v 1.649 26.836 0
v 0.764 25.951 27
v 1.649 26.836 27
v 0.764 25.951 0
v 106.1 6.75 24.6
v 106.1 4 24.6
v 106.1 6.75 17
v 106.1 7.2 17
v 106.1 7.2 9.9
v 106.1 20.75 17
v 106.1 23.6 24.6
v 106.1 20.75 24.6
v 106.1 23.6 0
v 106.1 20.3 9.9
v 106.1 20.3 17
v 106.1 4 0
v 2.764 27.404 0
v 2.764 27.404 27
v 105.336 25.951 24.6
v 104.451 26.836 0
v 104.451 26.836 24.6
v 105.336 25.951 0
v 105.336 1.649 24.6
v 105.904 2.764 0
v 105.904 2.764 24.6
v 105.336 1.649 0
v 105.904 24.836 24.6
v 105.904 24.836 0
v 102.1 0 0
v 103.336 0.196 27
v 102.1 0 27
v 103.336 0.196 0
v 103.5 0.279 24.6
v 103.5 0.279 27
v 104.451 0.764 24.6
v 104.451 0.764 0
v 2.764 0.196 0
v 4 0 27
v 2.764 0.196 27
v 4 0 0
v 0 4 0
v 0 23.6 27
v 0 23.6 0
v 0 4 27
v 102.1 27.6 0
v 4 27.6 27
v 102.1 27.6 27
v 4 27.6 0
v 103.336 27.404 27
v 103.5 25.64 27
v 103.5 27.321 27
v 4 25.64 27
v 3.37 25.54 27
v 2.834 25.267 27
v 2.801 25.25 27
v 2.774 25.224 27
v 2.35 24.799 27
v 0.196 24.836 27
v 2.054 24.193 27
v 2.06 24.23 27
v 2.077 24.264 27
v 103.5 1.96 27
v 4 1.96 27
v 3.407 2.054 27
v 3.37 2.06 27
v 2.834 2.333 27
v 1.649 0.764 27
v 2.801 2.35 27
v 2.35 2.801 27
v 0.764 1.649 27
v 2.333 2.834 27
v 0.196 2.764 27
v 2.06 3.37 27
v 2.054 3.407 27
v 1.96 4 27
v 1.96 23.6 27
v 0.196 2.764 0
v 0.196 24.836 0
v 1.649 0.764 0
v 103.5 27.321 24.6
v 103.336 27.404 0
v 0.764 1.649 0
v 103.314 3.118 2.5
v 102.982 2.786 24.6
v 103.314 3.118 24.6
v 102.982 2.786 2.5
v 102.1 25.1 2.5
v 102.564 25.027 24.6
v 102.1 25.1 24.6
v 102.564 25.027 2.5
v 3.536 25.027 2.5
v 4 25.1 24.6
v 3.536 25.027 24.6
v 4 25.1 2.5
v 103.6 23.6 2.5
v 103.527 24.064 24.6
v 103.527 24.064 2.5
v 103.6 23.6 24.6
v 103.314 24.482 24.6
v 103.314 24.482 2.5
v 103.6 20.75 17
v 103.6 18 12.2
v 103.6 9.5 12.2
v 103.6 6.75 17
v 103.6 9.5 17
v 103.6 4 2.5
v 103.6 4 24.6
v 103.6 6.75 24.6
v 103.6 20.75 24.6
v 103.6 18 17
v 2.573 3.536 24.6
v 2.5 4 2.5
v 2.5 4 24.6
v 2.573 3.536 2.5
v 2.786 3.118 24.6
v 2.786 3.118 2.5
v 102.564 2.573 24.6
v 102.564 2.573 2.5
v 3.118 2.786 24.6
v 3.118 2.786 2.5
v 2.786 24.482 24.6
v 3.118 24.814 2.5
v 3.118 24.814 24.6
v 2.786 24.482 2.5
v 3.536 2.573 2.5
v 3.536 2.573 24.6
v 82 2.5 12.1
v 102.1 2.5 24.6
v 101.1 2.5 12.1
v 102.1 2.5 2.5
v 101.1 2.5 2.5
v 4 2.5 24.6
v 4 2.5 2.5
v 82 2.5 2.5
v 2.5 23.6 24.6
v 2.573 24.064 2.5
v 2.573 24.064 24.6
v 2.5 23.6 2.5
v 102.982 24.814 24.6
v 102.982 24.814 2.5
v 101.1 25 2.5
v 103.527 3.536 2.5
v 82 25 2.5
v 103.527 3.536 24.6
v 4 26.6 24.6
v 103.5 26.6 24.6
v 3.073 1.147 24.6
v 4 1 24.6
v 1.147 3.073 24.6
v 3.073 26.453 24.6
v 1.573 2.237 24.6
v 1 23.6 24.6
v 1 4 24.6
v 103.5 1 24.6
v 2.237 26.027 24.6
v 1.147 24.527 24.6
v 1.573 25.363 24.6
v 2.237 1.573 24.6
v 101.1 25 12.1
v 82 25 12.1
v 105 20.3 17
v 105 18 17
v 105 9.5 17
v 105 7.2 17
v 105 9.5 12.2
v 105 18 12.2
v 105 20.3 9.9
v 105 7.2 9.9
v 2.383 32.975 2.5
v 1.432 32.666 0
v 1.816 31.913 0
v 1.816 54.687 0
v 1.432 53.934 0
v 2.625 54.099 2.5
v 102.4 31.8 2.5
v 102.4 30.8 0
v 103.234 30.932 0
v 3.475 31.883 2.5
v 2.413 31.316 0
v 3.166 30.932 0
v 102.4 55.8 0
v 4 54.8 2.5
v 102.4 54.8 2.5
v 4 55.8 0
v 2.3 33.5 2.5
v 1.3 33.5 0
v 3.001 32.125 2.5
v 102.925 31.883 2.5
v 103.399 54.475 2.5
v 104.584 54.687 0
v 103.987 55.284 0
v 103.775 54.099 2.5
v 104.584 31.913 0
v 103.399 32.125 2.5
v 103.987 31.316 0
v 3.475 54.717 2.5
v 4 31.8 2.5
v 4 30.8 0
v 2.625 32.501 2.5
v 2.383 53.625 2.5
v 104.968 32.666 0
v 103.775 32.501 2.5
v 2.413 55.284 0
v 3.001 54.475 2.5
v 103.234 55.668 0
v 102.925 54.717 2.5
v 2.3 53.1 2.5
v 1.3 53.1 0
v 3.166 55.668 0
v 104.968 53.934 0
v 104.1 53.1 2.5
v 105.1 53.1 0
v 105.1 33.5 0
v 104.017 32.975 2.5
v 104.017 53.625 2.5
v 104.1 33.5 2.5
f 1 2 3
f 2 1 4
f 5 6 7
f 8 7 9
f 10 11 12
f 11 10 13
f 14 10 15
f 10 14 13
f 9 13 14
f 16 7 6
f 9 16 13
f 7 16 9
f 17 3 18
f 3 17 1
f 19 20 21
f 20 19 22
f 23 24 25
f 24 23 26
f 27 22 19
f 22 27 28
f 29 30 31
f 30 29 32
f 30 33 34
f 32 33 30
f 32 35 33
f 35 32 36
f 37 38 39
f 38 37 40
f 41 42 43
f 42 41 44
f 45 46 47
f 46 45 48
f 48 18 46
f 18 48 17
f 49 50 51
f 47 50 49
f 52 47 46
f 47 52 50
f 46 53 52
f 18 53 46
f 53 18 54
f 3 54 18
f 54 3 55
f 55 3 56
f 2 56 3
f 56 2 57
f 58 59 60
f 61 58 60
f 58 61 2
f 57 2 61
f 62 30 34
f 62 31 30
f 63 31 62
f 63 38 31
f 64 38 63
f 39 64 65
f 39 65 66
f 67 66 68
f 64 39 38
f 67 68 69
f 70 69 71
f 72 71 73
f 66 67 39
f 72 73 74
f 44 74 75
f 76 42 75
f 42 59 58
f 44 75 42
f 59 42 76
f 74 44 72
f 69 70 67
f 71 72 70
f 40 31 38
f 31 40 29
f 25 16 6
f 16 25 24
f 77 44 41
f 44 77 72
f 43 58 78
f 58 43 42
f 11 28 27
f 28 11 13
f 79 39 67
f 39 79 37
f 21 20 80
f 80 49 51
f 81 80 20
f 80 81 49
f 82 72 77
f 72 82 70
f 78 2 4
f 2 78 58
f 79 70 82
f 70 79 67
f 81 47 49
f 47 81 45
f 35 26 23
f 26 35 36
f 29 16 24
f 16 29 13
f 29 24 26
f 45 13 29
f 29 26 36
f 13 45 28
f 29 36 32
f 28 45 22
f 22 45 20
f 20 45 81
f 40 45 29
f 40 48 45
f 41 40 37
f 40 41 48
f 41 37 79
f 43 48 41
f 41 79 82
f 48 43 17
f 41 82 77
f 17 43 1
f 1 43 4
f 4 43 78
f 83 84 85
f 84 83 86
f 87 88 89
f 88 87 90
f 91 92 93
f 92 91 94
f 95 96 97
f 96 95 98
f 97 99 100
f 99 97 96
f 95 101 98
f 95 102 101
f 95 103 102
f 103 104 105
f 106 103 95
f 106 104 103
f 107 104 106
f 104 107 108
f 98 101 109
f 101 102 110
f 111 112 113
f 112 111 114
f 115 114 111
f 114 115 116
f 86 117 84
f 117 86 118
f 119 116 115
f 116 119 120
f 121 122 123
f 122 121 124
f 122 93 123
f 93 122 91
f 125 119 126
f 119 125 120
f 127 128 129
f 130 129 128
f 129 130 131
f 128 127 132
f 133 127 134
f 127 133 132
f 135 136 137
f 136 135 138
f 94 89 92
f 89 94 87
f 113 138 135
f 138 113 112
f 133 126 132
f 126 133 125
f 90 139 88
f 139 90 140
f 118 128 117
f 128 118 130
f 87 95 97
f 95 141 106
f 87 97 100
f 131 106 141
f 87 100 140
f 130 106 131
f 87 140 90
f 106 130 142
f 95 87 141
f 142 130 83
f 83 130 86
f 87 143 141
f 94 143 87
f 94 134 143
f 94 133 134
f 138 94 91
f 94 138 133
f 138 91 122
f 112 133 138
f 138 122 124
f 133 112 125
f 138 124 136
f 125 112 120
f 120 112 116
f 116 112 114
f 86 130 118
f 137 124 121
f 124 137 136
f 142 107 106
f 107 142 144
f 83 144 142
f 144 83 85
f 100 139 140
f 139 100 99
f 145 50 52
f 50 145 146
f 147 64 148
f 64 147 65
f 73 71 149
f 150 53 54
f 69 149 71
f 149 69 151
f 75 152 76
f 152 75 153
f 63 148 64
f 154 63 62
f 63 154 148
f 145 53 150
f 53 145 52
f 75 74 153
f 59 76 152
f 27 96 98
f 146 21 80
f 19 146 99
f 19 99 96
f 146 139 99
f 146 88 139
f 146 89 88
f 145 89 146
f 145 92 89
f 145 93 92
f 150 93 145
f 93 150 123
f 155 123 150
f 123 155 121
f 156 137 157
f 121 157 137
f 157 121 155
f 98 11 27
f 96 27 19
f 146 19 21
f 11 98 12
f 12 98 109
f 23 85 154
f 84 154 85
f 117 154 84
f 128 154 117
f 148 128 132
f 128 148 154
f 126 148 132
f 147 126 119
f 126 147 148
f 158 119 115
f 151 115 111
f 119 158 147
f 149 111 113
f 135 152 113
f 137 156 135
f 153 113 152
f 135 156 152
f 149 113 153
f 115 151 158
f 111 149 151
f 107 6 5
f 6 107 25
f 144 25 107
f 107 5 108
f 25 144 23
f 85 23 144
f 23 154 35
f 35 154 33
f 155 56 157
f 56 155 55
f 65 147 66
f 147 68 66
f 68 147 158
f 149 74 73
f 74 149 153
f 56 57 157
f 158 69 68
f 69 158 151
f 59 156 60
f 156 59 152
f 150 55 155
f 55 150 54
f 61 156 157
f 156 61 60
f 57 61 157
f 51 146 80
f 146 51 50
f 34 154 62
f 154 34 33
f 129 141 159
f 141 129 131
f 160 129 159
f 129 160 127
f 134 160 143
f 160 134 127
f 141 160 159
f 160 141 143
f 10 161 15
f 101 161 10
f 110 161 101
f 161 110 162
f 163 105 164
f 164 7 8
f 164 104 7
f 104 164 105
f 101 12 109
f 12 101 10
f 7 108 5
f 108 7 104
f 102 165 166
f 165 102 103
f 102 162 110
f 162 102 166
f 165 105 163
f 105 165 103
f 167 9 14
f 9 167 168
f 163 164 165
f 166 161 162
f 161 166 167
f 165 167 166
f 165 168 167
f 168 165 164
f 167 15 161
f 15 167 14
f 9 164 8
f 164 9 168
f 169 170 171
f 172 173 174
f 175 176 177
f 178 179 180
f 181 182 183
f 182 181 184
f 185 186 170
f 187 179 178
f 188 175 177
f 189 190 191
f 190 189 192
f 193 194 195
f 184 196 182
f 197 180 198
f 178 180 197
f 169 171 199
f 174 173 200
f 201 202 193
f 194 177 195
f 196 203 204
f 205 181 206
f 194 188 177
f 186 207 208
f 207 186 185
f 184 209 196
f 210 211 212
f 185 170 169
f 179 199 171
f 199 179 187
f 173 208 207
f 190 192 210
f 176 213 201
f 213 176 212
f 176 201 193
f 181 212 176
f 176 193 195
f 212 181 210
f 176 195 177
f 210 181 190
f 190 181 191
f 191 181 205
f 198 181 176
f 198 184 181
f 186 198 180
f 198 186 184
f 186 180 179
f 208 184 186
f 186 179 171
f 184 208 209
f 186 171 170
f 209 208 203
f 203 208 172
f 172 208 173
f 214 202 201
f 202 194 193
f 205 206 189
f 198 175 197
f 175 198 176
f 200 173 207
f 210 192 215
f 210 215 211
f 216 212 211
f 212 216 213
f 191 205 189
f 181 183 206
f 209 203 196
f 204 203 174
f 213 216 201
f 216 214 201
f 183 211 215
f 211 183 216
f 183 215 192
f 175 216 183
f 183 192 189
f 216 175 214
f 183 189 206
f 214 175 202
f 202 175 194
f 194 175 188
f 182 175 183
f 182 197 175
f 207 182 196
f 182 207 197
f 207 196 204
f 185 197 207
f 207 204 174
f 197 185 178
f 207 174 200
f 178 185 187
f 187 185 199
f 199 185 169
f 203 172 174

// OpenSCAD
// Box to a 18650 battery in a holder plus usb charger
// 
// R J Tidey 21 NOV 2017
//

//Set up basic dimesnsions
i_width = 22.5;
i_length = 101.0;
i_height = 22.0;

wall = 2.5;

//extra width for mounting stuff
e_width = 0.0;

//slot for charging point; set socket_A to 0 to allow only micro USB access
socket_A = 1;
socket_height1 = 7.5;
socket_width1 = 14.0;
socket_length = 19.0;
socket_height2 = 4.8;
socket_width2 = 8.5;
//narrow wall around micro socket
socket_wall = 1.5;
socket_shoulder = 2.3;

width = i_width + 2 * wall + e_width;
length = i_length + 2 * wall;
height = i_height + wall;

//ensure that the edge roundness is greater than the wall thickness
edge_roundness = 4;
tolerance = 0.3;

$fn = 20;

inner_box_dimensions = [length,width,height];

module mainBox()
{
    difference ()
    {
        hull()
        {
            addOutterCorners(0,0);
            addOutterCorners(1,0);
            addOutterCorners(0,1);
            addOutterCorners(1,1);
        }
        
        translate([0,0,wall])
        hull()
        {
            addInnerCorners(0,0);
            addInnerCorners(1,0);
            addInnerCorners(0,1);
            addInnerCorners(1,1);
        }

        translate([0,0,inner_box_dimensions[2]+0.1])
        hull()
        {
            addLidCorners(0,0);
            addLidCorners(1,0);
            addLidCorners(0,1);
            addLidCorners(1,1);
        }

        translate([inner_box_dimensions[0]-wall,0,inner_box_dimensions[2]+0.1])
        cube([wall,inner_box_dimensions[1],wall]);
    }
}

module mainLid()
{
    translate([0,inner_box_dimensions[1]+2,0])
    difference ()
    {
        hull()
        {
            Lid(0,0);
            Lid(1,0);
            Lid(0,1);
            Lid(1,1);
        }
    }
}



module addOutterCorners(x = 0, y = 0)
{
	translate([(inner_box_dimensions[0] - edge_roundness*2 + 0.1)*x,(inner_box_dimensions[1] - edge_roundness*2 +0.1)*y,0] + [edge_roundness,edge_roundness,0])

	cylinder(inner_box_dimensions[2]+wall,edge_roundness,edge_roundness);
}

module addInnerCorners(x = 0, y = 0)
{
	translate([(inner_box_dimensions[0] - edge_roundness*2 + 0.1)*x,(inner_box_dimensions[1] - edge_roundness*2 +0.1)*y,0] + [edge_roundness,edge_roundness,0])

	cylinder(inner_box_dimensions[2],edge_roundness-wall,edge_roundness-wall);
}

module addLidCorners(x = 0, y = 0)
{
	translate([(inner_box_dimensions[0] - edge_roundness*2 - 0.1 +wall)*x,(inner_box_dimensions[1] - edge_roundness*2 +0.1)*y,0] + [edge_roundness,edge_roundness,0])

	cylinder(wall,edge_roundness-wall+1.5,edge_roundness-wall+0.5);
}

module Lid(x = 0, y = 0)
{
	translate([(inner_box_dimensions[0] - edge_roundness*2 - 0.1 +wall-2)*x,(inner_box_dimensions[1] - edge_roundness*2 +0.1)*y,0] + [edge_roundness,edge_roundness,0])

	cylinder(wall,edge_roundness-wall+1.5-tolerance,edge_roundness-wall+0.5-tolerance);
}


//make main box with holes
difference () {
   
    union() {
        mainBox();
        translate([i_length-socket_length, wall, wall-0.1]) {
            cube([socket_length+0.1, i_width,i_height-socket_height1-socket_height2]);
        }
        if(e_width>0) {
            translate([wall-0.1, wall+i_width-0.02, wall-0.1]) {
                cube([i_length+0.2, wall,i_height-socket_height1-socket_height2]);
            }
        }   
    }
    if(socket_A) {
        translate([length - wall - 0.5, (i_width + 2*wall - socket_width1)*.5, wall+i_height-socket_height1])
            cube([wall+1, socket_width1, socket_height1+1]);
    }
    translate([length - wall - 0.5, (i_width + 2*wall - socket_width2)*.5, wall+i_height-socket_height1-socket_height2])
        cube([wall+1, socket_width2, socket_height2]);
    translate([length-wall+socket_wall, (i_width+2*wall - socket_width2)*.5-socket_shoulder, wall+i_height-socket_height1-socket_height2-socket_shoulder])
        cube([wall+1, socket_width2+2*socket_shoulder, socket_height2+2*socket_shoulder]);
}


mainLid();
